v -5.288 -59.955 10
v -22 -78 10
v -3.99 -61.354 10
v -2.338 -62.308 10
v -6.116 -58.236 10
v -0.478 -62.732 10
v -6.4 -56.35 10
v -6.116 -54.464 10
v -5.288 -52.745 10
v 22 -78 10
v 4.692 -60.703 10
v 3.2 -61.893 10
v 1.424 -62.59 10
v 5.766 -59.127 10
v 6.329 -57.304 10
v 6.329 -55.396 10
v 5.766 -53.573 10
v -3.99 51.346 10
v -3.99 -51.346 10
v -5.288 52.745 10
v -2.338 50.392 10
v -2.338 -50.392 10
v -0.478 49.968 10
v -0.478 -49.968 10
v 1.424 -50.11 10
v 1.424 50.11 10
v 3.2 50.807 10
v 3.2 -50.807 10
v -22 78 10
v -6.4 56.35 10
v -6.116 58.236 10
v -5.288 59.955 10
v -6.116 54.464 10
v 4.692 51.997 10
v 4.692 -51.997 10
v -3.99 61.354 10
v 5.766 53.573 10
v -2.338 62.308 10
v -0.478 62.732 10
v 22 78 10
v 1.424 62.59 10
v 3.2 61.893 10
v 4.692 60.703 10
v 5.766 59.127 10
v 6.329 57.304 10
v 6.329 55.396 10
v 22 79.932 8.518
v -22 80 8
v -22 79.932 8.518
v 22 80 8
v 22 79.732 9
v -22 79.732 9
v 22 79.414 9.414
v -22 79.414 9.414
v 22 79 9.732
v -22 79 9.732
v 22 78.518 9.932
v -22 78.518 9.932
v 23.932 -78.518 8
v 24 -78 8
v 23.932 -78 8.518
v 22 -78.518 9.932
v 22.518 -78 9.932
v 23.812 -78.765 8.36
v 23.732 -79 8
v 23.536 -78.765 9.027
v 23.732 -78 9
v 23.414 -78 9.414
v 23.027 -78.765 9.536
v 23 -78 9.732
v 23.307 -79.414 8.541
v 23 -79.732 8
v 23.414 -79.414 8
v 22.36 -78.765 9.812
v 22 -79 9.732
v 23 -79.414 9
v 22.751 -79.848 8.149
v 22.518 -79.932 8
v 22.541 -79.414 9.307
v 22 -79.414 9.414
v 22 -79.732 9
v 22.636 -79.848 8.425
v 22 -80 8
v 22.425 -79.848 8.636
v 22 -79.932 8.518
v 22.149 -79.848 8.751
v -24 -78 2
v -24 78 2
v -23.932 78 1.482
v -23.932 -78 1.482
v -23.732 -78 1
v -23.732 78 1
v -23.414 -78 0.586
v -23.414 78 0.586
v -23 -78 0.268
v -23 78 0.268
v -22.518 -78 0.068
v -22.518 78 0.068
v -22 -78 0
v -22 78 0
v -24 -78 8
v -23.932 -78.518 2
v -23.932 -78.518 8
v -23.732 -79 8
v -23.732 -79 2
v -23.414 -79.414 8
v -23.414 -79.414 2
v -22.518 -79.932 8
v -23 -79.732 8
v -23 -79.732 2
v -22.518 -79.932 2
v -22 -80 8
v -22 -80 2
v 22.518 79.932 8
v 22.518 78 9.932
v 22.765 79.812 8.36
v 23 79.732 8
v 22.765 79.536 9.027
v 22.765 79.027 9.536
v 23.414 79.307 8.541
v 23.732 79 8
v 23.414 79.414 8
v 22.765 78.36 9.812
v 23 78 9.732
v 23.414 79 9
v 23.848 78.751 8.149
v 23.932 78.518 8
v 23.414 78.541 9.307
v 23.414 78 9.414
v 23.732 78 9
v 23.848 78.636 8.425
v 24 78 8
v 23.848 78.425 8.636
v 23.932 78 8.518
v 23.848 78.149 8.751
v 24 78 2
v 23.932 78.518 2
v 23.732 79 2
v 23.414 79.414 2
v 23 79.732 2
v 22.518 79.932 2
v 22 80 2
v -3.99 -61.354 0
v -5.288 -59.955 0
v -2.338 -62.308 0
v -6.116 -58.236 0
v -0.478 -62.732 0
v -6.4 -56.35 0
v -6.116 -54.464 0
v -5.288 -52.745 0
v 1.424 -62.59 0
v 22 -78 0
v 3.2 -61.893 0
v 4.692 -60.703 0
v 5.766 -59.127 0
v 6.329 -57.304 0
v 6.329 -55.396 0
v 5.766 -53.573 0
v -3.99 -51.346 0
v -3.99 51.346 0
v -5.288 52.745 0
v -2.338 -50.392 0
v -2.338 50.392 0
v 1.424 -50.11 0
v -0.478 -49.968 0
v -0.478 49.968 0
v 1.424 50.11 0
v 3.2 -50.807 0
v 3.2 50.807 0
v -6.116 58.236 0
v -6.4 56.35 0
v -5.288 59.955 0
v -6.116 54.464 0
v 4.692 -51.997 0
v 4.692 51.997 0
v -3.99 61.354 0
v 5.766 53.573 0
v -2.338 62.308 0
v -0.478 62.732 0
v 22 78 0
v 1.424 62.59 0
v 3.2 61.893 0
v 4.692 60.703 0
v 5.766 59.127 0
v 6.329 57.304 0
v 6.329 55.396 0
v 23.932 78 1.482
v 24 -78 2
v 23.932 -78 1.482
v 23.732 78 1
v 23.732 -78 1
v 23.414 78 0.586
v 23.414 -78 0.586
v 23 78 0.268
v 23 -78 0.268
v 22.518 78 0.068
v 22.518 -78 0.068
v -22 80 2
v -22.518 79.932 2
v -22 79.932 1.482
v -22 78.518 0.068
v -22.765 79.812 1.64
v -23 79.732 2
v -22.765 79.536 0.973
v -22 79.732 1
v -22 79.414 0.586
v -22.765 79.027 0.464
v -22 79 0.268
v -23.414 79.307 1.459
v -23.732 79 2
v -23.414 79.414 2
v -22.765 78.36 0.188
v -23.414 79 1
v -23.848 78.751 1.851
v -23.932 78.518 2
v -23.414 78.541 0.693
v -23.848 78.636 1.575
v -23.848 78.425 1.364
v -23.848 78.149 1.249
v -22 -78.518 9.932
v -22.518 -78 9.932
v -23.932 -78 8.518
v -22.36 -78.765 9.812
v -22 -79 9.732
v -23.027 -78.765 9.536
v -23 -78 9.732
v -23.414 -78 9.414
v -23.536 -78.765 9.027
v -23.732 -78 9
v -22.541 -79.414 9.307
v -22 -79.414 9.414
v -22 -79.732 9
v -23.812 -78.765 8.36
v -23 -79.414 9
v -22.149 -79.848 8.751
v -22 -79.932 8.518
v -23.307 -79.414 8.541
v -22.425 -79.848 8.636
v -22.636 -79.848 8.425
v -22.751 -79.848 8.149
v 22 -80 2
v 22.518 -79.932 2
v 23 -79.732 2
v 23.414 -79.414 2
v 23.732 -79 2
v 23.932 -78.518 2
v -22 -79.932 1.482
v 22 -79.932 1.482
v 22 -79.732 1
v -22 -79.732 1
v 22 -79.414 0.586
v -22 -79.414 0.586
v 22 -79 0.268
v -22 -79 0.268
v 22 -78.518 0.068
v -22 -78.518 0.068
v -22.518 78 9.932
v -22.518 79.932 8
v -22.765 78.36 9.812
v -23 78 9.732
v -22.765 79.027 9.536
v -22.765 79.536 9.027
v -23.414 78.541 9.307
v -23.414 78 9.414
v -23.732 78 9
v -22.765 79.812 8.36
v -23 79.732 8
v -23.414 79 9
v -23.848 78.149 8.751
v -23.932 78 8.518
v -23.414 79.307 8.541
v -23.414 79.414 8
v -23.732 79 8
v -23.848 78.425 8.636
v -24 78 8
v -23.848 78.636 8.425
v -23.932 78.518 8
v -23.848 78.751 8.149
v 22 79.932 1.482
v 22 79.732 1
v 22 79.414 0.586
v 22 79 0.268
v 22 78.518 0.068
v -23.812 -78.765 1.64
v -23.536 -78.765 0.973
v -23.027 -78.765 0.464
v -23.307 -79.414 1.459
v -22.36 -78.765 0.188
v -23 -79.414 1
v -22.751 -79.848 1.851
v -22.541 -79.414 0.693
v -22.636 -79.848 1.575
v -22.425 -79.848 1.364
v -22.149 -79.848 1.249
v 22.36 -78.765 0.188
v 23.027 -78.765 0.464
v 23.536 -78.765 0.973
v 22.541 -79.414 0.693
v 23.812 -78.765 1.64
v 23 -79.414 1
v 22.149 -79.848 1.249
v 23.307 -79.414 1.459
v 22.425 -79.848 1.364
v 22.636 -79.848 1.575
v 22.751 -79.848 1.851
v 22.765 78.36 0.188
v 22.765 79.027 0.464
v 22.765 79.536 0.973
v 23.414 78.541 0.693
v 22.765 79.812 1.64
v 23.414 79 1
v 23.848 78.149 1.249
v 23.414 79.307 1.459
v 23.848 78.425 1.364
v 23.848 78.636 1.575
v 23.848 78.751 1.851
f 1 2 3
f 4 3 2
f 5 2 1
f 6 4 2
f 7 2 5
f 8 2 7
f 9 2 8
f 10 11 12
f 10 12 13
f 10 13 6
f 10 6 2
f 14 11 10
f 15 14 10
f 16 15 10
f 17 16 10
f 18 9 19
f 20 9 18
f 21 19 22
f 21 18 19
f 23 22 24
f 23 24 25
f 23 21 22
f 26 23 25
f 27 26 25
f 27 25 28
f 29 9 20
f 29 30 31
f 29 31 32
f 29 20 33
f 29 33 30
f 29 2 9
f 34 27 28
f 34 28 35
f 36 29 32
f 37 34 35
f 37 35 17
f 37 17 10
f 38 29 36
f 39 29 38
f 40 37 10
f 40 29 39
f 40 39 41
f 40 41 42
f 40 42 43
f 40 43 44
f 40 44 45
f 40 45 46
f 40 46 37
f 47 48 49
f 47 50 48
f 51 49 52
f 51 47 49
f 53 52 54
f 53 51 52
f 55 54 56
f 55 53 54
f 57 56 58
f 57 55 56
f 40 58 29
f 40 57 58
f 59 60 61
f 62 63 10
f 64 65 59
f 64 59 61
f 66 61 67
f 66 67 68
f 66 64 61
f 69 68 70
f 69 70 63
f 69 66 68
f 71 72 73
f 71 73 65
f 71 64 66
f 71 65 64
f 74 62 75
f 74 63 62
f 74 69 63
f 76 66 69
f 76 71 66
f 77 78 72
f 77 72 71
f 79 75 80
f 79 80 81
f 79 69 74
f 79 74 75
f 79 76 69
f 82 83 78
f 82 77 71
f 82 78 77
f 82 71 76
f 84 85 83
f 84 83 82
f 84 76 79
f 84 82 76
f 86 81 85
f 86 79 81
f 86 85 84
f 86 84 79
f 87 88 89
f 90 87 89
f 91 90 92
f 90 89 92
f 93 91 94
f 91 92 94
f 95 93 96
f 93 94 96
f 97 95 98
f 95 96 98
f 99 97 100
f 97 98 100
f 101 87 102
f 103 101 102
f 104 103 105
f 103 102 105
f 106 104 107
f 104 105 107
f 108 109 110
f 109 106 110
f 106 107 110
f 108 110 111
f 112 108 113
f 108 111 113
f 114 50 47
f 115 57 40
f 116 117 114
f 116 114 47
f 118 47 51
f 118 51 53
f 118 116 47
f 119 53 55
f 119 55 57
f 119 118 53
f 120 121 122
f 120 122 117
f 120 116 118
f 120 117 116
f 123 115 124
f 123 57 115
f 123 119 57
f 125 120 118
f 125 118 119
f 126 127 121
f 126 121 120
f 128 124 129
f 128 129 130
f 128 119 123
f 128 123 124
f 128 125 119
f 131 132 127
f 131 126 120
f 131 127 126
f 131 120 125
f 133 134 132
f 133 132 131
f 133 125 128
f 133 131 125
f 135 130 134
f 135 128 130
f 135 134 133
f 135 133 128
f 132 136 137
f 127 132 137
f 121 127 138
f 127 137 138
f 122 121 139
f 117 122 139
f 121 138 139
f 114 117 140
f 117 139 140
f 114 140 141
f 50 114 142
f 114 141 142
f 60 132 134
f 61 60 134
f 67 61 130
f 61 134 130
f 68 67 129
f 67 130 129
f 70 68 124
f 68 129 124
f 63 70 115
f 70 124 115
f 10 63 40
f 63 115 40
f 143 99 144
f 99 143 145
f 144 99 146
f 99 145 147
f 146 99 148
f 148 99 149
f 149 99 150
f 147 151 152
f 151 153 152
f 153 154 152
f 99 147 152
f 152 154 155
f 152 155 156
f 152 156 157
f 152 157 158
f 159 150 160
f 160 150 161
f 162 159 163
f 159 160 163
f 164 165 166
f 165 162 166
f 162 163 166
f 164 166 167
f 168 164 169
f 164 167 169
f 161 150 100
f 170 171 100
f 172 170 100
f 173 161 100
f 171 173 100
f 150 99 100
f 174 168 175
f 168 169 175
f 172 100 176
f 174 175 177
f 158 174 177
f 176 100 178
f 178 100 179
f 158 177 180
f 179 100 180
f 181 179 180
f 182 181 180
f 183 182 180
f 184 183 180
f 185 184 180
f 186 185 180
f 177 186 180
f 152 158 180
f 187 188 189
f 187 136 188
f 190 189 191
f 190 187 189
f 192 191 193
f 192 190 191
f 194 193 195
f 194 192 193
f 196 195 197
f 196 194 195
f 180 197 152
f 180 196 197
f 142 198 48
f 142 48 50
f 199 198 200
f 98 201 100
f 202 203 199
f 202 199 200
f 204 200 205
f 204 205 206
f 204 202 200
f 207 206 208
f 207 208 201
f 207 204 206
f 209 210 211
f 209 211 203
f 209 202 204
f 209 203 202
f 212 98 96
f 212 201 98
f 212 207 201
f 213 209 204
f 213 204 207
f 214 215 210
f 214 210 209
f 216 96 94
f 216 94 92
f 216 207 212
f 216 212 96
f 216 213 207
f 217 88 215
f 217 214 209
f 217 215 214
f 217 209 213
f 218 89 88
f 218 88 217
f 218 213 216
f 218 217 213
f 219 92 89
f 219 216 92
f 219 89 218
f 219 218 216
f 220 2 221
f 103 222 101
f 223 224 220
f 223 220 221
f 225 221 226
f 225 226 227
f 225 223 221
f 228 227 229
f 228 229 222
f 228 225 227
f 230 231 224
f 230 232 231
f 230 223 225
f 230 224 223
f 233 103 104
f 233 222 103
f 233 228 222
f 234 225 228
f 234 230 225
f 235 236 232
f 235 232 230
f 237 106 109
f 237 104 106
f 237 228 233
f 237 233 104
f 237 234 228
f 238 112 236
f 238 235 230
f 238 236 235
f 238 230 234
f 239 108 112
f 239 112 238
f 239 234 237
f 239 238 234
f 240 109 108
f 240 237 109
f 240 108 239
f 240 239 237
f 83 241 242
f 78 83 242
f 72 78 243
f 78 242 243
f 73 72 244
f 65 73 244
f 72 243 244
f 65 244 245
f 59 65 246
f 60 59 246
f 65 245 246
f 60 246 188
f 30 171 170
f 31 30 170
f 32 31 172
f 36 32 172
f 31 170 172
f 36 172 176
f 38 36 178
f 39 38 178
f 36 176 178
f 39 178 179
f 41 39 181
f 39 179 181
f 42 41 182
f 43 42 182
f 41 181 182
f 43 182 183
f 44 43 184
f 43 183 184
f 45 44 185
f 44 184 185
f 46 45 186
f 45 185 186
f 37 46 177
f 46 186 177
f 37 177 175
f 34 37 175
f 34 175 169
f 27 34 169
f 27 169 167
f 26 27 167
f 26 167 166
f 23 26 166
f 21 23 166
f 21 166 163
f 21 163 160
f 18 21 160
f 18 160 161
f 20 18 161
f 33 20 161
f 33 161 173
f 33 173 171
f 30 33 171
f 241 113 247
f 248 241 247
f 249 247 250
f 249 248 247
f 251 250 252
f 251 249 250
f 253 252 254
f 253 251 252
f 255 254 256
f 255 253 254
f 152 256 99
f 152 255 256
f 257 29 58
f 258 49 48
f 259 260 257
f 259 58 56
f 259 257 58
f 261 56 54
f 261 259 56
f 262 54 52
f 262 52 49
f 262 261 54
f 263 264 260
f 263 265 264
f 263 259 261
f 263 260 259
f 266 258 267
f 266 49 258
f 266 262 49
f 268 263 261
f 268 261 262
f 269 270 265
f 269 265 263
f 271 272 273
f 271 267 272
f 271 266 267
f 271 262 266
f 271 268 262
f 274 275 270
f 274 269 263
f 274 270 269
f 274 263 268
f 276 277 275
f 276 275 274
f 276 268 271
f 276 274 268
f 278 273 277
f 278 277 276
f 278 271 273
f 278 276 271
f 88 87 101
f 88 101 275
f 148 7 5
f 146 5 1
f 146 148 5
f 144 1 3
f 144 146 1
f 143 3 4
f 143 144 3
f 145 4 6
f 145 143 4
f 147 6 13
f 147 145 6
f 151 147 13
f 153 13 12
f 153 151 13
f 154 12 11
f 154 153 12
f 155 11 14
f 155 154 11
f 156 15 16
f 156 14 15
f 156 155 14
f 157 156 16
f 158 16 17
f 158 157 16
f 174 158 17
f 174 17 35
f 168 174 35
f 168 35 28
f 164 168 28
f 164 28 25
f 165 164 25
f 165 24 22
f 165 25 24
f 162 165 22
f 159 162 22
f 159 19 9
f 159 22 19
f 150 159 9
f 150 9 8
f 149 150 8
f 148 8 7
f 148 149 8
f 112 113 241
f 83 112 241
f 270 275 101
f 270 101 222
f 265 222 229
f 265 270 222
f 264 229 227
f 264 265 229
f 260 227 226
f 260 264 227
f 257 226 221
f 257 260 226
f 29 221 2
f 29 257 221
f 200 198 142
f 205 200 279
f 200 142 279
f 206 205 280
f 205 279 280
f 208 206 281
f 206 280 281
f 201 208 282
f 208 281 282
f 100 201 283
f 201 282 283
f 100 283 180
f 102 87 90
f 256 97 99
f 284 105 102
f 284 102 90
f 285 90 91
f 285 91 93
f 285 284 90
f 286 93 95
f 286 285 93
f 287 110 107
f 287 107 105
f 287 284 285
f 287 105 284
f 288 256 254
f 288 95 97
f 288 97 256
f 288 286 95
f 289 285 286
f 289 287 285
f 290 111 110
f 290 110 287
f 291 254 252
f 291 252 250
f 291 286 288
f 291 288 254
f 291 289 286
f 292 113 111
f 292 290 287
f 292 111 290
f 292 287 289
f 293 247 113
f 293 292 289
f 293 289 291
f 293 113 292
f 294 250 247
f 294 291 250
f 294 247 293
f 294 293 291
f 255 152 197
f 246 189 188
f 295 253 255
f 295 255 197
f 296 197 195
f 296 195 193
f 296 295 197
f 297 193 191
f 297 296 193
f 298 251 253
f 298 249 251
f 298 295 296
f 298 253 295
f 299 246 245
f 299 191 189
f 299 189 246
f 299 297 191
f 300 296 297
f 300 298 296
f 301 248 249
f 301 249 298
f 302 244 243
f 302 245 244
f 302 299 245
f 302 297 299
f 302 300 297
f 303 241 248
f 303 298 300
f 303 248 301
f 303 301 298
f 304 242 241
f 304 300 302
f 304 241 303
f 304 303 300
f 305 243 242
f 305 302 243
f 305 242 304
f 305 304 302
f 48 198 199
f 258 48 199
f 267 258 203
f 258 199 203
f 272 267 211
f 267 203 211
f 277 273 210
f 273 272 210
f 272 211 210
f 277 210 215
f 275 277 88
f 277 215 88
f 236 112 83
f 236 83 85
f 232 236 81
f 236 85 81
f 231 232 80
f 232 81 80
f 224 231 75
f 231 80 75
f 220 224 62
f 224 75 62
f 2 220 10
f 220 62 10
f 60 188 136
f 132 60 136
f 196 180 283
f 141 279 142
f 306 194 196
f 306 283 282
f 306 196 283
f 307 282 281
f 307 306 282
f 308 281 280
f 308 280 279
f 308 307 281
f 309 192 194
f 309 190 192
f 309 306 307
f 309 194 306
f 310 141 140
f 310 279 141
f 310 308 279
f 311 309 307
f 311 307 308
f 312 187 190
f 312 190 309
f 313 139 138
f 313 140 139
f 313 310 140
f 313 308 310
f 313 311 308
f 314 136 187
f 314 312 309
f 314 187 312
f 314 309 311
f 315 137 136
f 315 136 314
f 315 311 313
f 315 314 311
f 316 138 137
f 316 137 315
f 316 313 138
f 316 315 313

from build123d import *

# Parameters (mm, degrees)
SKETCH1_W           = 48
SKETCH1_H           = 160
BOSS_EXTRUDE1_DEPTH = 10
FILLET1_R           = 2
FILLET2_R           = 2
SKETCH2_R           = 6.4
CUT_EXTRUDE1_DEPTH  = 85.118963379


with BuildPart() as part:
    # Sketch1 → Boss-Extrude1 (new body)
    with BuildSketch(Plane.XY):
        Rectangle(SKETCH1_W, SKETCH1_H)
    extrude(amount=BOSS_EXTRUDE1_DEPTH)

    # Fillet1
    fillet1_edges = [part.edges().sort_by_distance(p)[0] for p in [
        (-24, 0, 10),
        (0, -80, 10),
        (24, 0, 10),
        (0, -80, 0),
        (-24, 0, 0),
        (0, 80, 0),
        (24, 0, 0),
        (0, 80, 10),
    ]]
    fillet(fillet1_edges, radius=FILLET1_R)

    # Fillet2
    # the kernel refuses this fillet: 2 mm, written as the material it takes off along each edge
    with BuildSketch(Plane(origin=(-22, 78, 8), x_dir=(0, 1, 0), z_dir=(-1, 0, 0))) as fillet2_piece_1_section:
        Polygon((0, 0), (FILLET2_R, 0), (FILLET2_R, -FILLET2_R), (0, -FILLET2_R), align=None)
    fillet2_piece_1 = extrude(amount=FILLET2_R, mode=Mode.PRIVATE)
    fillet2_piece_1 = fillet2_piece_1 - Plane(origin=(-22, 78, 8), x_dir=(0, -0.7071067811865475, -0.7071067811865475), z_dir=(-1, 0, 0)) * Sphere(FILLET2_R, mode=Mode.PRIVATE)
    add(fillet2_piece_1, mode=Mode.SUBTRACT)
    with BuildSketch(Plane(origin=(22, 78, 8), x_dir=(0, 1, 0), z_dir=(1, 0, 0))) as fillet2_piece_2_section:
        Polygon((0, 0), (FILLET2_R, 0), (FILLET2_R, FILLET2_R), (0, FILLET2_R), align=None)
    fillet2_piece_2 = extrude(amount=FILLET2_R, mode=Mode.PRIVATE)
    fillet2_piece_2 = fillet2_piece_2 - Plane(origin=(22, 78, 8), x_dir=(0, -0.7071067811865475, -0.7071067811865475), z_dir=(1, 0, 0)) * Sphere(FILLET2_R, mode=Mode.PRIVATE)
    add(fillet2_piece_2, mode=Mode.SUBTRACT)
    with BuildSketch(Plane(origin=(-22, -78, 8), x_dir=(-1, 0, 0), z_dir=(0, -1, 0))) as fillet2_piece_3_section:
        Polygon((0, 0), (FILLET2_R, 0), (FILLET2_R, -FILLET2_R), (0, -FILLET2_R), align=None)
    fillet2_piece_3 = extrude(amount=FILLET2_R, mode=Mode.PRIVATE)
    fillet2_piece_3 = fillet2_piece_3 - Plane(origin=(-22, -78, 8), x_dir=(0.7071067811865475, 0, -0.7071067811865475), z_dir=(0, -1, 0)) * Sphere(FILLET2_R, mode=Mode.PRIVATE)
    add(fillet2_piece_3, mode=Mode.SUBTRACT)
    with BuildSketch(Plane(origin=(22, -78, 8), x_dir=(1, 0, 0), z_dir=(0, -1, 0))) as fillet2_piece_4_section:
        Polygon((0, 0), (FILLET2_R, 0), (FILLET2_R, FILLET2_R), (0, FILLET2_R), align=None)
    fillet2_piece_4 = extrude(amount=FILLET2_R, mode=Mode.PRIVATE)
    fillet2_piece_4 = fillet2_piece_4 - Plane(origin=(22, -78, 8), x_dir=(-0.7071067811865475, 0, -0.7071067811865475), z_dir=(0, -1, 0)) * Sphere(FILLET2_R, mode=Mode.PRIVATE)
    add(fillet2_piece_4, mode=Mode.SUBTRACT)
    with BuildSketch(Plane(origin=(22, -78, 2), x_dir=(1, 0, 0), z_dir=(0, -1, 0))) as fillet2_piece_5_section:
        Polygon((0, 0), (FILLET2_R, 0), (FILLET2_R, -FILLET2_R), (0, -FILLET2_R), align=None)
    fillet2_piece_5 = extrude(amount=FILLET2_R, mode=Mode.PRIVATE)
    fillet2_piece_5 = fillet2_piece_5 - Plane(origin=(22, -78, 2), x_dir=(-0.7071067811865475, 0, 0.7071067811865475), z_dir=(0, -1, 0)) * Sphere(FILLET2_R, mode=Mode.PRIVATE)
    add(fillet2_piece_5, mode=Mode.SUBTRACT)
    with BuildSketch(Plane(origin=(-22, -78, 2), x_dir=(-1, 0, 0), z_dir=(0, -1, 0))) as fillet2_piece_6_section:
        Polygon((0, 0), (FILLET2_R, 0), (FILLET2_R, FILLET2_R), (0, FILLET2_R), align=None)
    fillet2_piece_6 = extrude(amount=FILLET2_R, mode=Mode.PRIVATE)
    fillet2_piece_6 = fillet2_piece_6 - Plane(origin=(-22, -78, 2), x_dir=(0.7071067811865475, 0, 0.7071067811865475), z_dir=(0, -1, 0)) * Sphere(FILLET2_R, mode=Mode.PRIVATE)
    add(fillet2_piece_6, mode=Mode.SUBTRACT)
    with BuildSketch(Plane(origin=(22, 78, 2), x_dir=(0, 1, 0), z_dir=(1, 0, 0))) as fillet2_piece_7_section:
        Polygon((0, 0), (FILLET2_R, 0), (FILLET2_R, -FILLET2_R), (0, -FILLET2_R), align=None)
    fillet2_piece_7 = extrude(amount=FILLET2_R, mode=Mode.PRIVATE)
    fillet2_piece_7 = fillet2_piece_7 - Plane(origin=(22, 78, 2), x_dir=(0, -0.7071067811865475, 0.7071067811865475), z_dir=(1, 0, 0)) * Sphere(FILLET2_R, mode=Mode.PRIVATE)
    add(fillet2_piece_7, mode=Mode.SUBTRACT)
    with BuildSketch(Plane(origin=(-22, 78, 2), x_dir=(0, 1, 0), z_dir=(-1, 0, 0))) as fillet2_piece_8_section:
        Polygon((0, 0), (FILLET2_R, 0), (FILLET2_R, FILLET2_R), (0, FILLET2_R), align=None)
    fillet2_piece_8 = extrude(amount=FILLET2_R, mode=Mode.PRIVATE)
    fillet2_piece_8 = fillet2_piece_8 - Plane(origin=(-22, 78, 2), x_dir=(0, -0.7071067811865475, 0.7071067811865475), z_dir=(-1, 0, 0)) * Sphere(FILLET2_R, mode=Mode.PRIVATE)
    add(fillet2_piece_8, mode=Mode.SUBTRACT)
    with BuildSketch(Plane(origin=(24, -80, 2), x_dir=(-1, 0, 0), z_dir=(0, 0, 1)), Plane(origin=(24, 80, 2), x_dir=(0, -1, 0), z_dir=(0, 0, 1))) as fillet2_piece_9:
        with BuildLine():
            CenterArc((FILLET2_R, -FILLET2_R), FILLET2_R, 90, 90)
            Line((0, -FILLET2_R), (0, 0))
            Line((0, 0), (FILLET2_R, 0))
        make_face()
    extrude(amount=6, mode=Mode.SUBTRACT)
    with BuildSketch(Plane(origin=(-24, -80, 2), x_dir=(1, 0, 0), z_dir=(0, 0, 1)), Plane(origin=(-24, 80, 2), x_dir=(0, -1, 0), z_dir=(0, 0, 1))) as fillet2_piece_10:
        with BuildLine():
            CenterArc((FILLET2_R, FILLET2_R), FILLET2_R, 180, 90)
            Line((0, FILLET2_R), (0, 0))
            Line((0, 0), (FILLET2_R, 0))
        make_face()
    extrude(amount=6, mode=Mode.SUBTRACT)

    # Sketch2 → Cut-Extrude1 (cut, through all)
    with BuildSketch(Plane(origin=(0, 0, 0), x_dir=(-1, 0, 0), z_dir=(0, 0, -1))):
        with Locations((0, 56.35)):
            Circle(SKETCH2_R)
    cut_extrude1 = extrude(amount=-CUT_EXTRUDE1_DEPTH, mode=Mode.SUBTRACT)

    # Mirror2: Cut-Extrude1 across plane
    add(cut_extrude1.mirror(Plane.ZX), mode=Mode.SUBTRACT)


solid = part.part
